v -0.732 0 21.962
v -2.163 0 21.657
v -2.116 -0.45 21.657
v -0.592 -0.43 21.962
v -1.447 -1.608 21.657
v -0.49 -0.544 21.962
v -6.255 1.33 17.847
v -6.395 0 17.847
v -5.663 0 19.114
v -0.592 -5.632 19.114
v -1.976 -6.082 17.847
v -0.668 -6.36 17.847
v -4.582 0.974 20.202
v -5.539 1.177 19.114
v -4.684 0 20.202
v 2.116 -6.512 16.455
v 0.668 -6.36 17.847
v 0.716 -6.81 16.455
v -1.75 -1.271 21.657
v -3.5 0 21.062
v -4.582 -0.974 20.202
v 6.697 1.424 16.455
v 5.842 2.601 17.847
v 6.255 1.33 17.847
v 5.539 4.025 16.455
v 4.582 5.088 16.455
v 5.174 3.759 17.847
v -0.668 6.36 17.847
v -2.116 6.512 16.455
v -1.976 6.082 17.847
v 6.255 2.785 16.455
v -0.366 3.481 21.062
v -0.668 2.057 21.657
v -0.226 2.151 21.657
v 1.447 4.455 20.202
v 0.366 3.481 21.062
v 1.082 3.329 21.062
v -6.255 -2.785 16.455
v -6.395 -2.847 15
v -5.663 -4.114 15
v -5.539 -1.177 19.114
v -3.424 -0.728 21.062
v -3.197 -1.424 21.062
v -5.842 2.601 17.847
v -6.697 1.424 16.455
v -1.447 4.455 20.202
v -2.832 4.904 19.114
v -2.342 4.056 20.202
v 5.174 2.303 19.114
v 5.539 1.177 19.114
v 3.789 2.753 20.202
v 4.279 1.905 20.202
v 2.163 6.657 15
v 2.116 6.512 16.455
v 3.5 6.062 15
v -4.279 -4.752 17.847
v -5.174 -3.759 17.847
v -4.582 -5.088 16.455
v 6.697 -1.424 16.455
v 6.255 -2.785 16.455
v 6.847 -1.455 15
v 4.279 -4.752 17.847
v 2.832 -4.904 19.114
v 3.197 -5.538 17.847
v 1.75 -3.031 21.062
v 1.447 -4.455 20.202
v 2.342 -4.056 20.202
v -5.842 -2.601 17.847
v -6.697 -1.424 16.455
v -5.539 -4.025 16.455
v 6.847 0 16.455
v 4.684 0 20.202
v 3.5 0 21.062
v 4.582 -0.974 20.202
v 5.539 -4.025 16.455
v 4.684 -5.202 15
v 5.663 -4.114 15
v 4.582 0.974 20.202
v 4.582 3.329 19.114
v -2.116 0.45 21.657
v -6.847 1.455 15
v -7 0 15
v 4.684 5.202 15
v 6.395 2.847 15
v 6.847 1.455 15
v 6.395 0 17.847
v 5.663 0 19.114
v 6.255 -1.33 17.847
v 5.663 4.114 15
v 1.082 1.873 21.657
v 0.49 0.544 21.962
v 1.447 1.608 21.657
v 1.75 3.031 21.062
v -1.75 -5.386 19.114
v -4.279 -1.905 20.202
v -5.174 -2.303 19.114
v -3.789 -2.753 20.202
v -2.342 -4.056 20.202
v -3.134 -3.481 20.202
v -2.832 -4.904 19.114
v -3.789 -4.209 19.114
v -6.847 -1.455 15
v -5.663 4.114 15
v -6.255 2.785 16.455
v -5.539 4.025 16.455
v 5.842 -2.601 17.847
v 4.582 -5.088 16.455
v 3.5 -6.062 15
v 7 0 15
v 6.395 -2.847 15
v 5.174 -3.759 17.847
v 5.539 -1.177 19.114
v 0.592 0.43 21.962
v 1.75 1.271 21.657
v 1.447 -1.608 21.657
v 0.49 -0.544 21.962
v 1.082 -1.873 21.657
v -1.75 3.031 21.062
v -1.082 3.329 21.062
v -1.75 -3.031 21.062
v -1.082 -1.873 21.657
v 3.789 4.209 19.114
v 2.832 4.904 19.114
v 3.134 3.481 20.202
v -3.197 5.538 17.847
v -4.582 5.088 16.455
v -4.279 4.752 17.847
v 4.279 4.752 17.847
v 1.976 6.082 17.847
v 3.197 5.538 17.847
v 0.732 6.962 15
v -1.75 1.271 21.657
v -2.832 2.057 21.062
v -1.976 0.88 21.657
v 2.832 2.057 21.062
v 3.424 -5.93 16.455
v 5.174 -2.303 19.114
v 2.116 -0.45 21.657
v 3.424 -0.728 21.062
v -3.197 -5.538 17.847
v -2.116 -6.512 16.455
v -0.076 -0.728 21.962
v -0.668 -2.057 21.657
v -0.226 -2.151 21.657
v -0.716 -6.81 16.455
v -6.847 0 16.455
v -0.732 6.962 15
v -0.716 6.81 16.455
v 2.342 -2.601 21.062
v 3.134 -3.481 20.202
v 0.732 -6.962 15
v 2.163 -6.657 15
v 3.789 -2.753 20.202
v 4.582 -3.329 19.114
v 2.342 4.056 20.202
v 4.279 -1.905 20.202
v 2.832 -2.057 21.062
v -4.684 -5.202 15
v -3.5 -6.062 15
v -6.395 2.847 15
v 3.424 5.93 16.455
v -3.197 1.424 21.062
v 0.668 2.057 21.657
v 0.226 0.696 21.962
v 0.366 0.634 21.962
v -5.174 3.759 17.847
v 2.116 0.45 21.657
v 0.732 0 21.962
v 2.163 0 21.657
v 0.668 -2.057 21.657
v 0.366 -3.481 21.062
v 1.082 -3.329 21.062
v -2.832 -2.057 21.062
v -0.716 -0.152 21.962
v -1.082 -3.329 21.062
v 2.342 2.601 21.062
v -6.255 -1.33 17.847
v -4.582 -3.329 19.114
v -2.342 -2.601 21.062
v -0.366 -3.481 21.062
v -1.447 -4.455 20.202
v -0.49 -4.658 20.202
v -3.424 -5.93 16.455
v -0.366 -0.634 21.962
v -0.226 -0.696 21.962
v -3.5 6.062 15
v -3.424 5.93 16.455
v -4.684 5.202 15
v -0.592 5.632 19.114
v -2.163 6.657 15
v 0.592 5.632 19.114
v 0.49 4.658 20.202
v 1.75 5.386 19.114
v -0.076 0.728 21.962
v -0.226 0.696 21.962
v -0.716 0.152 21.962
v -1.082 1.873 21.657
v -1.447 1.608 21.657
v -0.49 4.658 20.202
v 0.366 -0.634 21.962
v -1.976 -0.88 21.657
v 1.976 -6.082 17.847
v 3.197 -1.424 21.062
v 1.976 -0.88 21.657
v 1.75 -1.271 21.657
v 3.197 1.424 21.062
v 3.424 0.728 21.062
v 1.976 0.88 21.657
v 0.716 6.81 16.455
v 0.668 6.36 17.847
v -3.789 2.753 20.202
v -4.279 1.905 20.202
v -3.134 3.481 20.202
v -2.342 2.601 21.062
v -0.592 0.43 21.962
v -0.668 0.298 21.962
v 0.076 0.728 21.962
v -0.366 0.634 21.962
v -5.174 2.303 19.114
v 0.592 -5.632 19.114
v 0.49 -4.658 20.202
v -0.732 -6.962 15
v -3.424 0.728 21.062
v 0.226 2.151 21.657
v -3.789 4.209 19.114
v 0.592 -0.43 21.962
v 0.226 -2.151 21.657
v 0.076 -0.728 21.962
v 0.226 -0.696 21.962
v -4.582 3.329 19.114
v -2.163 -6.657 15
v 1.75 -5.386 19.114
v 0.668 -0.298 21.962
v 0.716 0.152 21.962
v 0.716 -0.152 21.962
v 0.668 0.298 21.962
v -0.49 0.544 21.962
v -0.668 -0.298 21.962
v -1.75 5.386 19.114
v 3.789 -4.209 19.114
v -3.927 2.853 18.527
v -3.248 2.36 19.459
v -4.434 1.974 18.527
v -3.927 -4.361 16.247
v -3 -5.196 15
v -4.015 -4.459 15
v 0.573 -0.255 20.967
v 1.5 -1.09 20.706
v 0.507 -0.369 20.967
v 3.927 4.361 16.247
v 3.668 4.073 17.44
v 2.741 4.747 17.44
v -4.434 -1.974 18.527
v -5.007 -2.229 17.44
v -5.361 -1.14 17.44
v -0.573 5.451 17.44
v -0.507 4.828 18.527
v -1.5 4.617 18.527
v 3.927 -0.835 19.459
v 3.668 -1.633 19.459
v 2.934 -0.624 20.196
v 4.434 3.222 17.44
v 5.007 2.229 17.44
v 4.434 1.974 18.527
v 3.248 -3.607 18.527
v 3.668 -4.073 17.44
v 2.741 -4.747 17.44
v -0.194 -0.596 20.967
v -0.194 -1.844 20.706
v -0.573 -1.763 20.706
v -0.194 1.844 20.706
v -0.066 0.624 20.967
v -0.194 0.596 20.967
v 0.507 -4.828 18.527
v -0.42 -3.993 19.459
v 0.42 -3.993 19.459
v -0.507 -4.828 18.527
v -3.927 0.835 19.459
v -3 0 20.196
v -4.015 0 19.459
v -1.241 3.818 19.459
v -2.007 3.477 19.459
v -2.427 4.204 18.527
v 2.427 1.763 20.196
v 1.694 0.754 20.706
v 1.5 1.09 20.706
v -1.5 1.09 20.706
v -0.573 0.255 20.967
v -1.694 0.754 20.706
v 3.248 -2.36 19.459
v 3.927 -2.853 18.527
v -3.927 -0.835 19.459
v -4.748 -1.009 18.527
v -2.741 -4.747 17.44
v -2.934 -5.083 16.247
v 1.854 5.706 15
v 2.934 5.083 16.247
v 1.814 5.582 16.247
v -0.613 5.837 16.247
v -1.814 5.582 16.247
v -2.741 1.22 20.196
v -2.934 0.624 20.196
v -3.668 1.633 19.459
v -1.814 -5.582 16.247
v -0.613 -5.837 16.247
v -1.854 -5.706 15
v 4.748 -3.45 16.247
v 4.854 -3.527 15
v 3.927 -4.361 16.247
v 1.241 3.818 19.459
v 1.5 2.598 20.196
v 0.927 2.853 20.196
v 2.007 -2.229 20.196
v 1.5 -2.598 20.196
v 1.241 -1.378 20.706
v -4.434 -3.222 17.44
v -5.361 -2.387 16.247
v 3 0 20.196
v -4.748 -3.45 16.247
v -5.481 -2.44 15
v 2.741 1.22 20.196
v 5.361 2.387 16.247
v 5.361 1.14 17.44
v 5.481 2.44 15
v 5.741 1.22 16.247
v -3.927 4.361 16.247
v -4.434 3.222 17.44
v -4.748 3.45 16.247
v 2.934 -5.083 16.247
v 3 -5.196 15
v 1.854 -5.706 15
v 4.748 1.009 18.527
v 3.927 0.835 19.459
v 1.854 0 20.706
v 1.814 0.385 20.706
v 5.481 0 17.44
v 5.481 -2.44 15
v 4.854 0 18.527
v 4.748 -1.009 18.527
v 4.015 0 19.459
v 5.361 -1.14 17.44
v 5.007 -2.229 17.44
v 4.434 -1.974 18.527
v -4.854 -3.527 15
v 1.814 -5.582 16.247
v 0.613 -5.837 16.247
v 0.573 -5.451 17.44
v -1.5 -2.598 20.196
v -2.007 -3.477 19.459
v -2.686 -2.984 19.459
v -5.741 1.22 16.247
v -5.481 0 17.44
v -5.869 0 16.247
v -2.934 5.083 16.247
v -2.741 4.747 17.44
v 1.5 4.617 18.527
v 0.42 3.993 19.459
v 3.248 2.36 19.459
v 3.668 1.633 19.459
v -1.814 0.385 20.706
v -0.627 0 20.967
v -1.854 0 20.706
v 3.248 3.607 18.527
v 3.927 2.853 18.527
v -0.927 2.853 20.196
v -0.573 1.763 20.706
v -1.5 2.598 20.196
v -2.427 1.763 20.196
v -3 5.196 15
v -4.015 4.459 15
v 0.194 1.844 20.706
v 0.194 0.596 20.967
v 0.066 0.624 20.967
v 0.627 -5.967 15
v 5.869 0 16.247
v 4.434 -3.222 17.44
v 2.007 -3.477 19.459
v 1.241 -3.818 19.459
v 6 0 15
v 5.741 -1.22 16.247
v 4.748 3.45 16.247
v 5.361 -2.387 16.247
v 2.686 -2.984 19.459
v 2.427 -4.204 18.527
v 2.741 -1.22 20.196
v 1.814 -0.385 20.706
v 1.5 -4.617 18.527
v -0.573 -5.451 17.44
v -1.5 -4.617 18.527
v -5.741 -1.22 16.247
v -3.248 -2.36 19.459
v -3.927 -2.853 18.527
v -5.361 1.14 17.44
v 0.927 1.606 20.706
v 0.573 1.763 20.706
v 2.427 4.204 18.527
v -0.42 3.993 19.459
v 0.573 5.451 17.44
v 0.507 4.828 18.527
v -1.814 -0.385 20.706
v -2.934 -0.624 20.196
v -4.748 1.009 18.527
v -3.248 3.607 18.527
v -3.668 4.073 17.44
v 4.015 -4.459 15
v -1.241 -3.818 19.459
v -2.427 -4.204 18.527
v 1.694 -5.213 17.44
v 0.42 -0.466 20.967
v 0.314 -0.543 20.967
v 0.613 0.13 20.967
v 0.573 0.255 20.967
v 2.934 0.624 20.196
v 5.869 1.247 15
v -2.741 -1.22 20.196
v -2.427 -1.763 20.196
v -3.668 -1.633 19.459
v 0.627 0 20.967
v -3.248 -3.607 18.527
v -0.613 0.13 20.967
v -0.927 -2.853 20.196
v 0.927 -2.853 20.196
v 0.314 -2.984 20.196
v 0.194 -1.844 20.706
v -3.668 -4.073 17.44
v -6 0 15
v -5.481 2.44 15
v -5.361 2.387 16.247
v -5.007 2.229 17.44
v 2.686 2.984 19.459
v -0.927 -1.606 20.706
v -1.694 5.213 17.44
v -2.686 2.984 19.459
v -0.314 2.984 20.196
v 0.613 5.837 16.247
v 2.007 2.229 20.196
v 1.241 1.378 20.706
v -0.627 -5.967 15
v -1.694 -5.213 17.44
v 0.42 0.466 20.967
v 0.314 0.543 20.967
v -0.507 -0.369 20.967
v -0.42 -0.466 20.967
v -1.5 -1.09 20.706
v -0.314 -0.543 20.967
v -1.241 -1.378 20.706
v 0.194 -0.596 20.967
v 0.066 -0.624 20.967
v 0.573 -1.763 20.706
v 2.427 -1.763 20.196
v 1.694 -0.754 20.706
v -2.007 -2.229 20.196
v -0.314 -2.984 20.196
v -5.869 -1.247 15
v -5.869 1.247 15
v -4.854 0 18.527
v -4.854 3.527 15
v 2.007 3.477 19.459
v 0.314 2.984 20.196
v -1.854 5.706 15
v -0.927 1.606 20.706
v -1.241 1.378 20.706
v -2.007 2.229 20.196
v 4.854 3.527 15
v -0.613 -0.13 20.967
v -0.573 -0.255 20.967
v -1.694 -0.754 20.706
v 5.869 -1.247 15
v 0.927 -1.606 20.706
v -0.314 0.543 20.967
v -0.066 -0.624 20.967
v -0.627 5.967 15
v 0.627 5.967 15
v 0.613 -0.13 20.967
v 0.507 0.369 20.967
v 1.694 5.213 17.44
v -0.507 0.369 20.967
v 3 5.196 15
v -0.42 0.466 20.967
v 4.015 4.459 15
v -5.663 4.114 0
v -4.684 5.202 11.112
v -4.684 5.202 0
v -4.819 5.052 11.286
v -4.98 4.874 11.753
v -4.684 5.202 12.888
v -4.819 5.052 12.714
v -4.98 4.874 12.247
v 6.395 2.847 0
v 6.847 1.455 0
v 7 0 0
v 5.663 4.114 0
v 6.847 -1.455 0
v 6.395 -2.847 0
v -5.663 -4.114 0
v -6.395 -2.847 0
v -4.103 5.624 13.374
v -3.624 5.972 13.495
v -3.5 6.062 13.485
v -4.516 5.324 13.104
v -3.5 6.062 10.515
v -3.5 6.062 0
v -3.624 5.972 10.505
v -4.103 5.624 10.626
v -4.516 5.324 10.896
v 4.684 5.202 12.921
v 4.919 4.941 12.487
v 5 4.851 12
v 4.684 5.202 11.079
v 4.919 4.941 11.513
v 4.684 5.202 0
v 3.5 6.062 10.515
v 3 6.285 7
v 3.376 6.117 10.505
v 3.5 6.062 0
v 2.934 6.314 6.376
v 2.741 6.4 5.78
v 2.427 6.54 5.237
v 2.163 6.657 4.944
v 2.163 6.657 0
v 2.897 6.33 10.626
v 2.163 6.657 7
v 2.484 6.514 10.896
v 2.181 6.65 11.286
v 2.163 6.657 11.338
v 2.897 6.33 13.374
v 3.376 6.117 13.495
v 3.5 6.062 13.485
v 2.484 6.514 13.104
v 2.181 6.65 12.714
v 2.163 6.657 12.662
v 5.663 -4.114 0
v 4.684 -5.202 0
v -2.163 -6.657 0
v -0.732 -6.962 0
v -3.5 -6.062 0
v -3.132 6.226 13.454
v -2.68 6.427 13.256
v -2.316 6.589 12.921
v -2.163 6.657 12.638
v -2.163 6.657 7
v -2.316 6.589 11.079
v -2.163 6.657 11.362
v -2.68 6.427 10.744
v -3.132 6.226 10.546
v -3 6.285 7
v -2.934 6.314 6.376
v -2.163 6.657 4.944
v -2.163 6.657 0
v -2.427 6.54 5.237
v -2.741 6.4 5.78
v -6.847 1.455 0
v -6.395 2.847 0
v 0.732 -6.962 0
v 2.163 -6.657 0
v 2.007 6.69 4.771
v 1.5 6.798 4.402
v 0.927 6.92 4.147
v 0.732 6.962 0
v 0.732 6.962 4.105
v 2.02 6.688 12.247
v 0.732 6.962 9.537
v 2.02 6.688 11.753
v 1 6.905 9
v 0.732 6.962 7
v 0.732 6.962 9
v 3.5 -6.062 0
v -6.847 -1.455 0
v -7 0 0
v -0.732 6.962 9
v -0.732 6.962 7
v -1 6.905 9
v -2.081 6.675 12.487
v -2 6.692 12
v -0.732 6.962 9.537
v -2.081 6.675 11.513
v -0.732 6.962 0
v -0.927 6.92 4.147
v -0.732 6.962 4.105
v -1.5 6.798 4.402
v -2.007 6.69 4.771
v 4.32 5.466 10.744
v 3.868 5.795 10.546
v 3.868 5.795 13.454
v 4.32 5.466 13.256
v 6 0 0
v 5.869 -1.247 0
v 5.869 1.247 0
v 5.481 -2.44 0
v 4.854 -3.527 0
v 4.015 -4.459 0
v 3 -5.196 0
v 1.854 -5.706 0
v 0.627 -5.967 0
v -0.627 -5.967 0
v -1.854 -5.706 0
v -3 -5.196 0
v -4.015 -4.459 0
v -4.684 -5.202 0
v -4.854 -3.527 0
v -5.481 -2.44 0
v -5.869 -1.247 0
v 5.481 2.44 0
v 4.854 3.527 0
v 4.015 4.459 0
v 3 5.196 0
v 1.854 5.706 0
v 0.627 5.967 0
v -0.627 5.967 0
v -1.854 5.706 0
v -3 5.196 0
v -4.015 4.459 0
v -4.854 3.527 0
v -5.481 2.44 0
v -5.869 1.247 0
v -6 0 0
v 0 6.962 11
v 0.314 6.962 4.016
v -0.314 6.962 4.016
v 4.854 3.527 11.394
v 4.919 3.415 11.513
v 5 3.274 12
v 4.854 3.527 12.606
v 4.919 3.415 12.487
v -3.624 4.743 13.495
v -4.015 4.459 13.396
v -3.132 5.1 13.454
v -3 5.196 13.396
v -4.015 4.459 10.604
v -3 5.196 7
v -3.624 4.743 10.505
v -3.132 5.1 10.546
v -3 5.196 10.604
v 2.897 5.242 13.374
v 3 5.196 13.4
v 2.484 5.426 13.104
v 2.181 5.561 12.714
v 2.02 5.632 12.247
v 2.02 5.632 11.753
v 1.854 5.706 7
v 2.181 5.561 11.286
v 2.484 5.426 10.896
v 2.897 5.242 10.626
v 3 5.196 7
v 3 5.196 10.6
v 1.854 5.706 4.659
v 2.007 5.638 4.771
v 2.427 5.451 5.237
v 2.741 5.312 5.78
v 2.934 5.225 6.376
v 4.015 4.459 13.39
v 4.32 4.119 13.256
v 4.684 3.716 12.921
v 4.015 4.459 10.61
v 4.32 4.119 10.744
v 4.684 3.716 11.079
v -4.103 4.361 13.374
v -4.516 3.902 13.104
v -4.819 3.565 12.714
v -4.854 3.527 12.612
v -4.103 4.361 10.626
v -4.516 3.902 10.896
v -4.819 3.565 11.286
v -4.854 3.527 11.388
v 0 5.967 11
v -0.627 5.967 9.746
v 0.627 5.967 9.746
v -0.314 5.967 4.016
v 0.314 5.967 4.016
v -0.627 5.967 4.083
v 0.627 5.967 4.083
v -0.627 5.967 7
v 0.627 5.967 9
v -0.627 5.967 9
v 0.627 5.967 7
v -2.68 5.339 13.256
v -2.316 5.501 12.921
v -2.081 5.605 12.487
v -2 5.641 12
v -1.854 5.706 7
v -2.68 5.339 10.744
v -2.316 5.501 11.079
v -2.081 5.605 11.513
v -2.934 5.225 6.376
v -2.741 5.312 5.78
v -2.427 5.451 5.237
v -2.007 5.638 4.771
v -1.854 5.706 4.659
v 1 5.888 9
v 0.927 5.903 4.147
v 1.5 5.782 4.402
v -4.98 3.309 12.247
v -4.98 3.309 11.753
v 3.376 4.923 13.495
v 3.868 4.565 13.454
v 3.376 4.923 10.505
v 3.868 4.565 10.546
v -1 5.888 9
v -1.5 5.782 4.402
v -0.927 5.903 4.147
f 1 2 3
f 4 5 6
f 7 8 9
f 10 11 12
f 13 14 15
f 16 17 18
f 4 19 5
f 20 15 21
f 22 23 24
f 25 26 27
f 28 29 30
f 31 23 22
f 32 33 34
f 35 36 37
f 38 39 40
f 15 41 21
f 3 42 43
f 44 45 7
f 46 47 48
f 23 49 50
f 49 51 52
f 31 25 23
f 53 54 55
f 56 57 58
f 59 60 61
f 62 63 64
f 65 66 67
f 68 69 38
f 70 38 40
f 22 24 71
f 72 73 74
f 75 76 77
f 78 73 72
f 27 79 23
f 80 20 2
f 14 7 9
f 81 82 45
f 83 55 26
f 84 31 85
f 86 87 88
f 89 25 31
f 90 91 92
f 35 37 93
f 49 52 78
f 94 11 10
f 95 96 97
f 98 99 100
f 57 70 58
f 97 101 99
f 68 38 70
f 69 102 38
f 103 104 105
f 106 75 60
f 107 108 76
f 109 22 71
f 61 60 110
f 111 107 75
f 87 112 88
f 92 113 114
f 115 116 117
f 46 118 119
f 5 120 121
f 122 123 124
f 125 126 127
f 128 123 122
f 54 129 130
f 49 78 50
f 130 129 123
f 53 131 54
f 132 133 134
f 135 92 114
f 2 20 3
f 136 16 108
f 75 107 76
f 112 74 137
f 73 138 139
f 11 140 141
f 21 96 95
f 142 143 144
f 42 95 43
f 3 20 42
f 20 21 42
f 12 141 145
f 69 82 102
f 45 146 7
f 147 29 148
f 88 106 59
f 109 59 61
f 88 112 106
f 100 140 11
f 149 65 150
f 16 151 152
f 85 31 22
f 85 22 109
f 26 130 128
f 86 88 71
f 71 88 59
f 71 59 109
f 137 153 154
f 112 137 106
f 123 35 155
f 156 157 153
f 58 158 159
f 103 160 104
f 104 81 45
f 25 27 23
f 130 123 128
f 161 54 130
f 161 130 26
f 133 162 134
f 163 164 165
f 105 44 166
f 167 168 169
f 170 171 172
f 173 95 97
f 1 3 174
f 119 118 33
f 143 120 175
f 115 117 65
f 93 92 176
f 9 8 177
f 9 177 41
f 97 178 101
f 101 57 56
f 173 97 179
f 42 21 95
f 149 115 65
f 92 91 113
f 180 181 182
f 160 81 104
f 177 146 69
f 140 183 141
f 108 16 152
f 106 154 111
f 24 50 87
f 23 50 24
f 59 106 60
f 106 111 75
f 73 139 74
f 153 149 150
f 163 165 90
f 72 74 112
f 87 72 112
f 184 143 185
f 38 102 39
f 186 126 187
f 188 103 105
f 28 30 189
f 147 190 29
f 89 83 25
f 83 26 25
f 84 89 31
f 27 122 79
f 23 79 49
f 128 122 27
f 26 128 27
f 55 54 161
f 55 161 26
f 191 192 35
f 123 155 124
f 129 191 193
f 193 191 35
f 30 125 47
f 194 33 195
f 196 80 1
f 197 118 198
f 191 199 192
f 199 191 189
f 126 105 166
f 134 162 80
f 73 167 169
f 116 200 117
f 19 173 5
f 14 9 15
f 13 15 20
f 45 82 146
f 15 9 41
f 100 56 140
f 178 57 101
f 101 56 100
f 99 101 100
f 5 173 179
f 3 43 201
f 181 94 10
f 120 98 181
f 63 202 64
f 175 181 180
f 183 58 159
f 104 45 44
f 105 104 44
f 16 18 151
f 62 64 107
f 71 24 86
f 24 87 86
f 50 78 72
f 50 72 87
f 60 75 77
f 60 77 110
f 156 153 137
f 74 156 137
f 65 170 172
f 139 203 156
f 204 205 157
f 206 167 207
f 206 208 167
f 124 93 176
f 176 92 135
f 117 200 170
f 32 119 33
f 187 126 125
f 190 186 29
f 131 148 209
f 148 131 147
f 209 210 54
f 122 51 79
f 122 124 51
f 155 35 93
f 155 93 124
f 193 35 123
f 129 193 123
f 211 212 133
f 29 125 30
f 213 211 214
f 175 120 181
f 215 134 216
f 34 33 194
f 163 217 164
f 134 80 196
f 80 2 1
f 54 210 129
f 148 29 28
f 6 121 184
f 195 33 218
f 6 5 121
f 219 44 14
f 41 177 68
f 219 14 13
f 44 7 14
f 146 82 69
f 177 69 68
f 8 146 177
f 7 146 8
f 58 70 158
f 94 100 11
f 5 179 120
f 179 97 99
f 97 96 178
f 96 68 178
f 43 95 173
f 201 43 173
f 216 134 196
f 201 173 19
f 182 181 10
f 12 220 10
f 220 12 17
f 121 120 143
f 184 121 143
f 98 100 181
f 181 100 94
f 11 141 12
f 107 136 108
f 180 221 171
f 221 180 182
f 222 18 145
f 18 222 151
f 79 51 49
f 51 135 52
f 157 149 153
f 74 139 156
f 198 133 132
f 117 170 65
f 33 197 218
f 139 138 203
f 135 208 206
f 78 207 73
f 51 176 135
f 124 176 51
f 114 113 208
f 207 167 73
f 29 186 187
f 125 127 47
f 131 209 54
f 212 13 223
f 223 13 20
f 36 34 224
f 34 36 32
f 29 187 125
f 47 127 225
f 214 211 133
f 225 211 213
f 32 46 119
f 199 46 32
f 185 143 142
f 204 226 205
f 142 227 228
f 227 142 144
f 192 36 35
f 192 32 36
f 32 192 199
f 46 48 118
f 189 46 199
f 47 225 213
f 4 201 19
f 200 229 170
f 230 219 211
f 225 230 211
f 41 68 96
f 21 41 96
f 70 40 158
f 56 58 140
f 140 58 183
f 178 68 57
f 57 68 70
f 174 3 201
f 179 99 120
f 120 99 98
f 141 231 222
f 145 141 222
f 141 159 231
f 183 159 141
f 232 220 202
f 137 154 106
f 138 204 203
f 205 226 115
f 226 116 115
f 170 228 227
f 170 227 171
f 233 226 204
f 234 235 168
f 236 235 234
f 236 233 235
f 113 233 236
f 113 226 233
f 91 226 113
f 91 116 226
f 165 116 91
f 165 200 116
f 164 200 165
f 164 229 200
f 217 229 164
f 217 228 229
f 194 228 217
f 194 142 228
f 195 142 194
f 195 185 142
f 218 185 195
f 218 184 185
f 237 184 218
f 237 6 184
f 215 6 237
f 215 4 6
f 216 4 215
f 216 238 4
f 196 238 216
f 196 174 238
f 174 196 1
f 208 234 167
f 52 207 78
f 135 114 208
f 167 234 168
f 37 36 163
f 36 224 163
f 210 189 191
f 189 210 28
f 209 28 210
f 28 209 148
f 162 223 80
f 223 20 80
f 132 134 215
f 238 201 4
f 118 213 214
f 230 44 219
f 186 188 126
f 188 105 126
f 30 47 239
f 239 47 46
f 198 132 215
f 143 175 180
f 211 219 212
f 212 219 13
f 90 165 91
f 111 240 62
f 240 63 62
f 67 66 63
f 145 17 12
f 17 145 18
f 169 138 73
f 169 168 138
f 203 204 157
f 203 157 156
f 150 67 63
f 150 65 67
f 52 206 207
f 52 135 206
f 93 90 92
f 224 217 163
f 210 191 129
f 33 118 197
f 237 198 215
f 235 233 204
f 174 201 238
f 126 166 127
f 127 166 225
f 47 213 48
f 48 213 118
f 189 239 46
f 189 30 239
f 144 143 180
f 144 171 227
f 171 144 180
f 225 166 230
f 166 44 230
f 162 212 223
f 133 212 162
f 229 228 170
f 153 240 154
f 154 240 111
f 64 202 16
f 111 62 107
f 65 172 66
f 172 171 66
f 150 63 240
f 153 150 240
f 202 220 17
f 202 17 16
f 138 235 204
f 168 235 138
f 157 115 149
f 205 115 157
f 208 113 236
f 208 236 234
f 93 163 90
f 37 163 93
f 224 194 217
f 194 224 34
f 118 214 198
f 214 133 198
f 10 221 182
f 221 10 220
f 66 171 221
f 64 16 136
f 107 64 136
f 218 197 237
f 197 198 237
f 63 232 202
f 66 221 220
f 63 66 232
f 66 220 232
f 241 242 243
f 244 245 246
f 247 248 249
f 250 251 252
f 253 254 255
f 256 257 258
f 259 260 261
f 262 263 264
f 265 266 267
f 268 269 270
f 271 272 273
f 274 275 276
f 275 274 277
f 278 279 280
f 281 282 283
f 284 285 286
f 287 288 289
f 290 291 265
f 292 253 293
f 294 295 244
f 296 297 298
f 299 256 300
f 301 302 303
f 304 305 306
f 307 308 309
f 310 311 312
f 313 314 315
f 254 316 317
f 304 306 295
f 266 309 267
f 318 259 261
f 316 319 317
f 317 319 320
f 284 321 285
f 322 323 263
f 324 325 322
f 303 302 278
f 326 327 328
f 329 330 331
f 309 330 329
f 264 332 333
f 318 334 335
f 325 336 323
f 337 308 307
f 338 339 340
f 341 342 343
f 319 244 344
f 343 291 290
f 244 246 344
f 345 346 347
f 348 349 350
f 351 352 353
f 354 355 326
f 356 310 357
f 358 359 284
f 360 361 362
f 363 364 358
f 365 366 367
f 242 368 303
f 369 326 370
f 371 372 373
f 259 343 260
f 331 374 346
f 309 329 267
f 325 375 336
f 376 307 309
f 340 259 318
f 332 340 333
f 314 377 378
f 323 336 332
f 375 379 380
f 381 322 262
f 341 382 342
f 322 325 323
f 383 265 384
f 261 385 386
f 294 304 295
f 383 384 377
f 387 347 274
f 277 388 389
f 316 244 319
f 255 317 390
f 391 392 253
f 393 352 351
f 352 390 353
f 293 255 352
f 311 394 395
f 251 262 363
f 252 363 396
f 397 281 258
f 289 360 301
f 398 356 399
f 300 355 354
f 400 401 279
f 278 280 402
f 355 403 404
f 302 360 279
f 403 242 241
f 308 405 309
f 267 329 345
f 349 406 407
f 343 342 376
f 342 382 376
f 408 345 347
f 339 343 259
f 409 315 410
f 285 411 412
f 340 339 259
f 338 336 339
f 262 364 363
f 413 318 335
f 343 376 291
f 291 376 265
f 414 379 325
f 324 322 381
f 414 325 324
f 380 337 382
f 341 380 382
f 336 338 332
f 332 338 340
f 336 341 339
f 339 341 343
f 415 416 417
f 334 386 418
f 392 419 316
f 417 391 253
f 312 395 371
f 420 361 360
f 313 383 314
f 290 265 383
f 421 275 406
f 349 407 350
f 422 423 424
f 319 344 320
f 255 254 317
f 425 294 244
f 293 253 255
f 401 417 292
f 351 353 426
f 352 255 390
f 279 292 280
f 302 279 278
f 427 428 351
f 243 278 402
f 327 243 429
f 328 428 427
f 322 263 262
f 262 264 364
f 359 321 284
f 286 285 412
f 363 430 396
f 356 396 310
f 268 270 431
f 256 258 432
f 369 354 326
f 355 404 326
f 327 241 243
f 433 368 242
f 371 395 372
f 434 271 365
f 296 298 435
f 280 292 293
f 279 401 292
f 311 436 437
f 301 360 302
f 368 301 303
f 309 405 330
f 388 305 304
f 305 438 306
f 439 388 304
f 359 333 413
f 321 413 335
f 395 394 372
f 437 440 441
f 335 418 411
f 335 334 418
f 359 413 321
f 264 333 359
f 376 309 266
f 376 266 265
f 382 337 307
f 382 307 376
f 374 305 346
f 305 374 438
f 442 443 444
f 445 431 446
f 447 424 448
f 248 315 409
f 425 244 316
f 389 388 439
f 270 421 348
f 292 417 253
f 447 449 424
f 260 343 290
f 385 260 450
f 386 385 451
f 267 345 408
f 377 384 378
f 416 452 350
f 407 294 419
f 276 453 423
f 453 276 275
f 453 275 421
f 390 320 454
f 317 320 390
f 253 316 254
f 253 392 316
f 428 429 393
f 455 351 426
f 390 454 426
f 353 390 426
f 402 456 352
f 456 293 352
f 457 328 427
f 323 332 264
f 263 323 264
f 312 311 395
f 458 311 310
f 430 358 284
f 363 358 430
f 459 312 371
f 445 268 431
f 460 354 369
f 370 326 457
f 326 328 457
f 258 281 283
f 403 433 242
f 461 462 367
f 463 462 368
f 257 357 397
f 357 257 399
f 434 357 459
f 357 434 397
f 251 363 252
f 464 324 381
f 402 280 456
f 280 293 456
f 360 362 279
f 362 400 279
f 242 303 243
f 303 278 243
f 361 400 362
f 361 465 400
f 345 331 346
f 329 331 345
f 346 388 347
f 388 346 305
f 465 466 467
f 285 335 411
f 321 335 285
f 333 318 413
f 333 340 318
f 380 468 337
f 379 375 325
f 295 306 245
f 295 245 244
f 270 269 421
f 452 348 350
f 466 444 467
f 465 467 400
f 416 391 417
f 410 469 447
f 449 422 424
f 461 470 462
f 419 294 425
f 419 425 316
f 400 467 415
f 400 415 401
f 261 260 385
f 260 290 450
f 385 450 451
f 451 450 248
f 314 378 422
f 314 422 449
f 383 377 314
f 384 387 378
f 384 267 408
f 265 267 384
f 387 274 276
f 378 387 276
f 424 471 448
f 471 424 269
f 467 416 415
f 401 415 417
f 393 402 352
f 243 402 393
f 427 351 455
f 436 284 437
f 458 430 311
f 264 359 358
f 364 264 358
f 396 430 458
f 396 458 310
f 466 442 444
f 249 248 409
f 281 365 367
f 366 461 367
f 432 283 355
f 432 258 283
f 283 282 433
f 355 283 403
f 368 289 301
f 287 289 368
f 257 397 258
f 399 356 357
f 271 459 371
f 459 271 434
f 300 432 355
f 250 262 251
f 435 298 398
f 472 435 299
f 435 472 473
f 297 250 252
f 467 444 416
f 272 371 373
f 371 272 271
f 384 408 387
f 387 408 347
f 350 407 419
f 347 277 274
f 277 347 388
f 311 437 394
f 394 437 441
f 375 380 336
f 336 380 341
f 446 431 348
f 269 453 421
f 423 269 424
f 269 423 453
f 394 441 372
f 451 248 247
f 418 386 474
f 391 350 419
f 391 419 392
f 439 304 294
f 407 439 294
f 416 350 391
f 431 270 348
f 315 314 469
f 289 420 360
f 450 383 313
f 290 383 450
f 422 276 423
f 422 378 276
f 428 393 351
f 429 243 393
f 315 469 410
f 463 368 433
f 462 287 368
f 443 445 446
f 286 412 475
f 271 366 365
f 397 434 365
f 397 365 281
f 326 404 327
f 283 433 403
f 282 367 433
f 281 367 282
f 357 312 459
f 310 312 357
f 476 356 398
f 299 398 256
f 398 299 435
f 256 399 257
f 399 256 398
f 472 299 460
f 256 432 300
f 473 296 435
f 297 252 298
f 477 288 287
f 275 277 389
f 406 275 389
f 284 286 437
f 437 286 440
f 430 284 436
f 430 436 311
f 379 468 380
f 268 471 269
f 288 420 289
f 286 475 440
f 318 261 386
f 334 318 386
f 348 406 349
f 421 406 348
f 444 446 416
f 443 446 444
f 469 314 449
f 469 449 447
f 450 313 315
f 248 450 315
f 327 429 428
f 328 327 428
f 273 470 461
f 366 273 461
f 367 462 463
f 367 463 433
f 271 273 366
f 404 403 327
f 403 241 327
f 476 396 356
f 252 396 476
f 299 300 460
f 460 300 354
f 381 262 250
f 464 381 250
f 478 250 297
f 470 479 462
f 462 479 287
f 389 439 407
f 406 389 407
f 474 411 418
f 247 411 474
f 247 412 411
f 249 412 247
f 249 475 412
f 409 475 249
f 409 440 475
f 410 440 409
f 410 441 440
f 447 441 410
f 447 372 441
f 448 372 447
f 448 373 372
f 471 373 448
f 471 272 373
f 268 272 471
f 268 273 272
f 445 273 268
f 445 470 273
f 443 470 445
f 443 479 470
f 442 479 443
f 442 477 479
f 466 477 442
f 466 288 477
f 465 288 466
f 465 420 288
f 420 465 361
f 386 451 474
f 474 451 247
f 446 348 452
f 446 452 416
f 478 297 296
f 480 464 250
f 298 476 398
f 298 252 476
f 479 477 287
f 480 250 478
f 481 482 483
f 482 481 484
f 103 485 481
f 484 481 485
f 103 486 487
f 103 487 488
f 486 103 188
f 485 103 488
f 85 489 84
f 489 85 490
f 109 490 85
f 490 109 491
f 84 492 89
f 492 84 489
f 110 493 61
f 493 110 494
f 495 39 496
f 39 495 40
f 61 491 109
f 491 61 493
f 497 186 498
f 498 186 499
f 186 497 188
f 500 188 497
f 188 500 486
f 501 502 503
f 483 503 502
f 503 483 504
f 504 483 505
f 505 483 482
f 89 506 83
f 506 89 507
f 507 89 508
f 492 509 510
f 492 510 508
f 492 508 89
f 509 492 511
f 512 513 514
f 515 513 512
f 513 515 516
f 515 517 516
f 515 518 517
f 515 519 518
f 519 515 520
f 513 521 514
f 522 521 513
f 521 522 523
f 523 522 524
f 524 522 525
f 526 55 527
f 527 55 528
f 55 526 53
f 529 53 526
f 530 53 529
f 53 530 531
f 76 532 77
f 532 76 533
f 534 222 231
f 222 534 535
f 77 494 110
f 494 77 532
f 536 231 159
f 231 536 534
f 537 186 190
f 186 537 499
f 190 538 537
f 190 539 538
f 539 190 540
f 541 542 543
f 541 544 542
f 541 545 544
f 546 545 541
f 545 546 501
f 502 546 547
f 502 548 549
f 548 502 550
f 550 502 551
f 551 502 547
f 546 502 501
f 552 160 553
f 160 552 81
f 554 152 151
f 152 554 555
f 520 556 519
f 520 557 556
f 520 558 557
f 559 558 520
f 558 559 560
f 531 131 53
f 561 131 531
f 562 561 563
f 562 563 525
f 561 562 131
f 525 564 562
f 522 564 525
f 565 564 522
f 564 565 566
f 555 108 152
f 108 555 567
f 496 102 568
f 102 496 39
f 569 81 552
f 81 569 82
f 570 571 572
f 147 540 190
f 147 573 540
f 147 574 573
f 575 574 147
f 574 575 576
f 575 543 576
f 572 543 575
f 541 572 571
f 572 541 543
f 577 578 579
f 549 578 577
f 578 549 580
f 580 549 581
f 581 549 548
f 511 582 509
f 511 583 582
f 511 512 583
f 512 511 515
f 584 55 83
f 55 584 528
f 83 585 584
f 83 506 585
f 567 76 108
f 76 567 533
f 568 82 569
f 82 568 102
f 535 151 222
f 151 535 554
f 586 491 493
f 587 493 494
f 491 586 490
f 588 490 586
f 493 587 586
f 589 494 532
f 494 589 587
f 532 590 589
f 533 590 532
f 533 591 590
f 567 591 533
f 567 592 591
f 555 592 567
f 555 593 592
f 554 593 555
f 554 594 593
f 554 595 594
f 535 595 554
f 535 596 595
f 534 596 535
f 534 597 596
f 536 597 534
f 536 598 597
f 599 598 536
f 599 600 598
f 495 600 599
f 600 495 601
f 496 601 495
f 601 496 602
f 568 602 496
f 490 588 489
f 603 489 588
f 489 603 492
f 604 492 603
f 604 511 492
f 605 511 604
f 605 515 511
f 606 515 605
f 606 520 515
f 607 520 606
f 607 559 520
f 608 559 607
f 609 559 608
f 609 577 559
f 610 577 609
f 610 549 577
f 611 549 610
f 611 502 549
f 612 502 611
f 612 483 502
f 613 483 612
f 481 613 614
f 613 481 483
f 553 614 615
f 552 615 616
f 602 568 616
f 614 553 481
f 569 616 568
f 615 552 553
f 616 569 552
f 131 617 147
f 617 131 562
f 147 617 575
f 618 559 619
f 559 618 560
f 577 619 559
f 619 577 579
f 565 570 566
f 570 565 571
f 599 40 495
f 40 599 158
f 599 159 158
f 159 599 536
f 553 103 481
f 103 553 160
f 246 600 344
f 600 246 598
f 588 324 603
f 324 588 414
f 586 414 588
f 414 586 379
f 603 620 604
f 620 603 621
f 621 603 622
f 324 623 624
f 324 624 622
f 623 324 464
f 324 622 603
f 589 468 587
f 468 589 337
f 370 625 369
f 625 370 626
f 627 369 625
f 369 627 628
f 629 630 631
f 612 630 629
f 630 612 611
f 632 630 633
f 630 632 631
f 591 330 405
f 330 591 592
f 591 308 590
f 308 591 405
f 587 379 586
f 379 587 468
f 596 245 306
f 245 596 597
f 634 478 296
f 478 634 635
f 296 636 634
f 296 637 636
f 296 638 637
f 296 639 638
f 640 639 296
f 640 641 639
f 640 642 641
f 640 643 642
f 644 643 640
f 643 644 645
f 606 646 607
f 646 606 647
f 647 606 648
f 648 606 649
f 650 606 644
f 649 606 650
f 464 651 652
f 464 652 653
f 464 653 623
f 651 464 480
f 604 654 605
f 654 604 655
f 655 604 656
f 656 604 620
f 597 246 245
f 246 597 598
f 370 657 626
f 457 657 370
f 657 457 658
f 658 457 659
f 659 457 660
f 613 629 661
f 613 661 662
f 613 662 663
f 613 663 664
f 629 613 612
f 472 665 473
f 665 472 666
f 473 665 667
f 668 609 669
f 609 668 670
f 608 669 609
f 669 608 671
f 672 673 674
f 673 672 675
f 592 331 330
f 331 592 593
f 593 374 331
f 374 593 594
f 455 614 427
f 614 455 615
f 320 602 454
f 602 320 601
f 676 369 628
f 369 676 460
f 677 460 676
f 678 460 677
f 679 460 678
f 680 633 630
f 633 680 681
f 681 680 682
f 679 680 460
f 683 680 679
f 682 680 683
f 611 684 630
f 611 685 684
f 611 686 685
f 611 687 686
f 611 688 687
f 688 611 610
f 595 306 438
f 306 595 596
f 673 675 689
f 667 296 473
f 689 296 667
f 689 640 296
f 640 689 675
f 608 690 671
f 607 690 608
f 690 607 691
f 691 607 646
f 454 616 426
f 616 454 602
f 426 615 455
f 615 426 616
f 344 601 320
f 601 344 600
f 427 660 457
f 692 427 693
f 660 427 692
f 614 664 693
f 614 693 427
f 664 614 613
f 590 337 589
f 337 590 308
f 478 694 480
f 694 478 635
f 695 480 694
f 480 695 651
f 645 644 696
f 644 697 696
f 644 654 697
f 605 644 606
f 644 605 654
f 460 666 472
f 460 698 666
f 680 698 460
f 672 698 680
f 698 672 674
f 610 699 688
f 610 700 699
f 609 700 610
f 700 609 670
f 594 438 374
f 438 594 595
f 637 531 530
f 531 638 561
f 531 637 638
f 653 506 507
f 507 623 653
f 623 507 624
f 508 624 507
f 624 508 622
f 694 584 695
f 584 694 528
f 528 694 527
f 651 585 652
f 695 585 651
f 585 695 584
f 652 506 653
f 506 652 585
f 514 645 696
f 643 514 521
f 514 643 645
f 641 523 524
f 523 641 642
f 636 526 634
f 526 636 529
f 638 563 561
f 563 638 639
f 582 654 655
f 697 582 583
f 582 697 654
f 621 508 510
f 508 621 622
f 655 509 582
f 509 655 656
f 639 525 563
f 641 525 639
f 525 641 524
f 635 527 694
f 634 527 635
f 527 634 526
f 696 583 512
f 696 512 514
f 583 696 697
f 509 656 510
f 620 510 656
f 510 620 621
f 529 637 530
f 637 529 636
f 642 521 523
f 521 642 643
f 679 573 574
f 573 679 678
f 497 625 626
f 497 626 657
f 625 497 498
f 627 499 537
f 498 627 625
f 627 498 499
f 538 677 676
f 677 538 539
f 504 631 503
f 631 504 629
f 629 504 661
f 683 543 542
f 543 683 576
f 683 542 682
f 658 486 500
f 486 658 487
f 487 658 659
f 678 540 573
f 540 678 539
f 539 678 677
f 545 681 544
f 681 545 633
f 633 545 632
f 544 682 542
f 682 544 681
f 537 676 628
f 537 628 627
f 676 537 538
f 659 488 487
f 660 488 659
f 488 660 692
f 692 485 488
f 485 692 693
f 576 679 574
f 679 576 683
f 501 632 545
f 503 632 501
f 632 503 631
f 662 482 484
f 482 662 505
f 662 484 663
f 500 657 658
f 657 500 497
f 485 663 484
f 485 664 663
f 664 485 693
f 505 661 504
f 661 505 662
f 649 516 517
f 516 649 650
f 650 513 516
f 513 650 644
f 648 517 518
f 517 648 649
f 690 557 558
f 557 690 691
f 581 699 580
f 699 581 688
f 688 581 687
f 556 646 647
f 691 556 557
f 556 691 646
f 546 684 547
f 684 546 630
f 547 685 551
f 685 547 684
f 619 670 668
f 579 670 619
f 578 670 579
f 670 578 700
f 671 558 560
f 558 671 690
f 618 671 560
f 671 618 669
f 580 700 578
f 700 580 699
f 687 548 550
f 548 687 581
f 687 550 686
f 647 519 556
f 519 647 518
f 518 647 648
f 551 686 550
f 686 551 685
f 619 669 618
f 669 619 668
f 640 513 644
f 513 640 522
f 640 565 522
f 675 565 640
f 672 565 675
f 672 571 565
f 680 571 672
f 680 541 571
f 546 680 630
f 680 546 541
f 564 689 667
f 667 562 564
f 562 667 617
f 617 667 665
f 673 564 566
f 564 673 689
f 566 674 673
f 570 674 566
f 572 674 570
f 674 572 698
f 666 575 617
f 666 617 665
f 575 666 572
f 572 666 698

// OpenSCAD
// --------------------------------------------------
//   a full scaleable ghost                              
//   with different moods: happy, sad, upset                                                                //
//   author:  probot128                                  
//   mailto:  km@ulthryvasse.de                     
//   date:     2012-07-23
//   file:       ghost.scad
//   version: 1.0
//
//   function: just call the module ghost(...)
//                and a ghost appears, with
//                changing of the parameterset
//                you can change the apearance
//                of the ghost
//   parameterset: look at the example
// --------------------------------------------------

module head(headradius,headheight,headthickness)
{
	translate([0,0,headheight])
	difference()
	{
		difference()
		{
			sphere(r=headradius);
			sphere(r=headradius-headthickness);
		}
		translate([-headradius,-headradius,-headradius*2-2])
		cube(headradius*2+2,headradius*2+2,headradius+1);
	}
	difference()
	{
		cylinder(h=headheight, r=headradius);
		translate([0,0,-1])
		cylinder(h=headheight+2, r=headradius-headthickness);
	}
}

module eyes(eyesize, eyedistance, eyeheight,headradius)
{
	translate([eyedistance,headradius,eyeheight])
	rotate([90,0,0])
	cylinder(h=headradius, r=eyesize);
	translate([-eyedistance,headradius,eyeheight])
	rotate([90,0,0])
	cylinder(h=headradius, r=eyesize);
}

module nose(nosesize,noseheight,headradius)
{
	translate([0,headradius,noseheight])
	rotate([90,0,0])
	linear_extrude(height=headradius)
	polygon(points = [ [-nosesize, 0], [nosesize, 0], [0, 2*nosesize]]);
}

module mouth(mouthsize,mouthheight,mood,headradius)
{
	translate([0,0,mouthheight])
	rotate([270,0,0])
	if(mood==0)
	{
		cylinder(h=headradius, r=mouthsize);
	} 
	else 
	{
		if (mood==1)
		{
			difference()
			{
				cylinder(h=headradius, r=mouthsize);
				translate([-mouthsize,-2*mouthsize,0])
				cube([2*mouthsize,2*mouthsize,headradius+1]);
			}
		}
		else
		{
			if (mood==2)
			{
				difference()
				{
					cylinder(h=headradius, r=mouthsize);
					translate([-mouthsize,0,0])
					cube([2*mouthsize,2*mouthsize,headradius+1]);
				}
			}
		}
	}
}

module ghost(headradius, headheight, headthickness, eyesize, eyedistance, eyeheight, nosesize, noseheight, mouthsize, mouthheight, mood)
{
	difference()
	{
		head(headradius, headheight, headthickness);
		eyes(eyesize, eyedistance, eyeheight, headradius);
		nose(nosesize, noseheight, headradius);
		mouth(mouthsize, mouthheight, mood, headradius);
	}
}

$fs=0.5;
ghost(7,15,1,1.5,3.5,12,1,9,3,7,1);

// module ghost(headradius, headheight, headthickness, eyesize, 
// eyedistance, eyeheight, nosesize, noseheight, mouthsize, 
// mouthheight, mood)
//
// headradius:      thickness of the complete ghost
// headheight:      the height of the cylinder without the sphere, 
//                        for complete height add headradius
// headthickness:  the ghost is hollow, you can define the thickness 
//                        of the walls
// eyesize:            how big are the eyes
// eyedistance:      how far away from the center do you want to 
//                        position the eye
// eyeheight:        how high - measured from the bottom - 
//                        do you want to position the eyes
// nosesize:           how big is the nose
// noseheight:       how high - measured from the bottom - 
//                         do you want to position the nose
// mouthsize:        how big is the mouth
// mouthheight:    how high - measured from the bottom - 
//                        do you want to position the mouth
// mood:              0 - for saying "Ohhh"
//                        1 - for happiness
//                        2 - for sadness
